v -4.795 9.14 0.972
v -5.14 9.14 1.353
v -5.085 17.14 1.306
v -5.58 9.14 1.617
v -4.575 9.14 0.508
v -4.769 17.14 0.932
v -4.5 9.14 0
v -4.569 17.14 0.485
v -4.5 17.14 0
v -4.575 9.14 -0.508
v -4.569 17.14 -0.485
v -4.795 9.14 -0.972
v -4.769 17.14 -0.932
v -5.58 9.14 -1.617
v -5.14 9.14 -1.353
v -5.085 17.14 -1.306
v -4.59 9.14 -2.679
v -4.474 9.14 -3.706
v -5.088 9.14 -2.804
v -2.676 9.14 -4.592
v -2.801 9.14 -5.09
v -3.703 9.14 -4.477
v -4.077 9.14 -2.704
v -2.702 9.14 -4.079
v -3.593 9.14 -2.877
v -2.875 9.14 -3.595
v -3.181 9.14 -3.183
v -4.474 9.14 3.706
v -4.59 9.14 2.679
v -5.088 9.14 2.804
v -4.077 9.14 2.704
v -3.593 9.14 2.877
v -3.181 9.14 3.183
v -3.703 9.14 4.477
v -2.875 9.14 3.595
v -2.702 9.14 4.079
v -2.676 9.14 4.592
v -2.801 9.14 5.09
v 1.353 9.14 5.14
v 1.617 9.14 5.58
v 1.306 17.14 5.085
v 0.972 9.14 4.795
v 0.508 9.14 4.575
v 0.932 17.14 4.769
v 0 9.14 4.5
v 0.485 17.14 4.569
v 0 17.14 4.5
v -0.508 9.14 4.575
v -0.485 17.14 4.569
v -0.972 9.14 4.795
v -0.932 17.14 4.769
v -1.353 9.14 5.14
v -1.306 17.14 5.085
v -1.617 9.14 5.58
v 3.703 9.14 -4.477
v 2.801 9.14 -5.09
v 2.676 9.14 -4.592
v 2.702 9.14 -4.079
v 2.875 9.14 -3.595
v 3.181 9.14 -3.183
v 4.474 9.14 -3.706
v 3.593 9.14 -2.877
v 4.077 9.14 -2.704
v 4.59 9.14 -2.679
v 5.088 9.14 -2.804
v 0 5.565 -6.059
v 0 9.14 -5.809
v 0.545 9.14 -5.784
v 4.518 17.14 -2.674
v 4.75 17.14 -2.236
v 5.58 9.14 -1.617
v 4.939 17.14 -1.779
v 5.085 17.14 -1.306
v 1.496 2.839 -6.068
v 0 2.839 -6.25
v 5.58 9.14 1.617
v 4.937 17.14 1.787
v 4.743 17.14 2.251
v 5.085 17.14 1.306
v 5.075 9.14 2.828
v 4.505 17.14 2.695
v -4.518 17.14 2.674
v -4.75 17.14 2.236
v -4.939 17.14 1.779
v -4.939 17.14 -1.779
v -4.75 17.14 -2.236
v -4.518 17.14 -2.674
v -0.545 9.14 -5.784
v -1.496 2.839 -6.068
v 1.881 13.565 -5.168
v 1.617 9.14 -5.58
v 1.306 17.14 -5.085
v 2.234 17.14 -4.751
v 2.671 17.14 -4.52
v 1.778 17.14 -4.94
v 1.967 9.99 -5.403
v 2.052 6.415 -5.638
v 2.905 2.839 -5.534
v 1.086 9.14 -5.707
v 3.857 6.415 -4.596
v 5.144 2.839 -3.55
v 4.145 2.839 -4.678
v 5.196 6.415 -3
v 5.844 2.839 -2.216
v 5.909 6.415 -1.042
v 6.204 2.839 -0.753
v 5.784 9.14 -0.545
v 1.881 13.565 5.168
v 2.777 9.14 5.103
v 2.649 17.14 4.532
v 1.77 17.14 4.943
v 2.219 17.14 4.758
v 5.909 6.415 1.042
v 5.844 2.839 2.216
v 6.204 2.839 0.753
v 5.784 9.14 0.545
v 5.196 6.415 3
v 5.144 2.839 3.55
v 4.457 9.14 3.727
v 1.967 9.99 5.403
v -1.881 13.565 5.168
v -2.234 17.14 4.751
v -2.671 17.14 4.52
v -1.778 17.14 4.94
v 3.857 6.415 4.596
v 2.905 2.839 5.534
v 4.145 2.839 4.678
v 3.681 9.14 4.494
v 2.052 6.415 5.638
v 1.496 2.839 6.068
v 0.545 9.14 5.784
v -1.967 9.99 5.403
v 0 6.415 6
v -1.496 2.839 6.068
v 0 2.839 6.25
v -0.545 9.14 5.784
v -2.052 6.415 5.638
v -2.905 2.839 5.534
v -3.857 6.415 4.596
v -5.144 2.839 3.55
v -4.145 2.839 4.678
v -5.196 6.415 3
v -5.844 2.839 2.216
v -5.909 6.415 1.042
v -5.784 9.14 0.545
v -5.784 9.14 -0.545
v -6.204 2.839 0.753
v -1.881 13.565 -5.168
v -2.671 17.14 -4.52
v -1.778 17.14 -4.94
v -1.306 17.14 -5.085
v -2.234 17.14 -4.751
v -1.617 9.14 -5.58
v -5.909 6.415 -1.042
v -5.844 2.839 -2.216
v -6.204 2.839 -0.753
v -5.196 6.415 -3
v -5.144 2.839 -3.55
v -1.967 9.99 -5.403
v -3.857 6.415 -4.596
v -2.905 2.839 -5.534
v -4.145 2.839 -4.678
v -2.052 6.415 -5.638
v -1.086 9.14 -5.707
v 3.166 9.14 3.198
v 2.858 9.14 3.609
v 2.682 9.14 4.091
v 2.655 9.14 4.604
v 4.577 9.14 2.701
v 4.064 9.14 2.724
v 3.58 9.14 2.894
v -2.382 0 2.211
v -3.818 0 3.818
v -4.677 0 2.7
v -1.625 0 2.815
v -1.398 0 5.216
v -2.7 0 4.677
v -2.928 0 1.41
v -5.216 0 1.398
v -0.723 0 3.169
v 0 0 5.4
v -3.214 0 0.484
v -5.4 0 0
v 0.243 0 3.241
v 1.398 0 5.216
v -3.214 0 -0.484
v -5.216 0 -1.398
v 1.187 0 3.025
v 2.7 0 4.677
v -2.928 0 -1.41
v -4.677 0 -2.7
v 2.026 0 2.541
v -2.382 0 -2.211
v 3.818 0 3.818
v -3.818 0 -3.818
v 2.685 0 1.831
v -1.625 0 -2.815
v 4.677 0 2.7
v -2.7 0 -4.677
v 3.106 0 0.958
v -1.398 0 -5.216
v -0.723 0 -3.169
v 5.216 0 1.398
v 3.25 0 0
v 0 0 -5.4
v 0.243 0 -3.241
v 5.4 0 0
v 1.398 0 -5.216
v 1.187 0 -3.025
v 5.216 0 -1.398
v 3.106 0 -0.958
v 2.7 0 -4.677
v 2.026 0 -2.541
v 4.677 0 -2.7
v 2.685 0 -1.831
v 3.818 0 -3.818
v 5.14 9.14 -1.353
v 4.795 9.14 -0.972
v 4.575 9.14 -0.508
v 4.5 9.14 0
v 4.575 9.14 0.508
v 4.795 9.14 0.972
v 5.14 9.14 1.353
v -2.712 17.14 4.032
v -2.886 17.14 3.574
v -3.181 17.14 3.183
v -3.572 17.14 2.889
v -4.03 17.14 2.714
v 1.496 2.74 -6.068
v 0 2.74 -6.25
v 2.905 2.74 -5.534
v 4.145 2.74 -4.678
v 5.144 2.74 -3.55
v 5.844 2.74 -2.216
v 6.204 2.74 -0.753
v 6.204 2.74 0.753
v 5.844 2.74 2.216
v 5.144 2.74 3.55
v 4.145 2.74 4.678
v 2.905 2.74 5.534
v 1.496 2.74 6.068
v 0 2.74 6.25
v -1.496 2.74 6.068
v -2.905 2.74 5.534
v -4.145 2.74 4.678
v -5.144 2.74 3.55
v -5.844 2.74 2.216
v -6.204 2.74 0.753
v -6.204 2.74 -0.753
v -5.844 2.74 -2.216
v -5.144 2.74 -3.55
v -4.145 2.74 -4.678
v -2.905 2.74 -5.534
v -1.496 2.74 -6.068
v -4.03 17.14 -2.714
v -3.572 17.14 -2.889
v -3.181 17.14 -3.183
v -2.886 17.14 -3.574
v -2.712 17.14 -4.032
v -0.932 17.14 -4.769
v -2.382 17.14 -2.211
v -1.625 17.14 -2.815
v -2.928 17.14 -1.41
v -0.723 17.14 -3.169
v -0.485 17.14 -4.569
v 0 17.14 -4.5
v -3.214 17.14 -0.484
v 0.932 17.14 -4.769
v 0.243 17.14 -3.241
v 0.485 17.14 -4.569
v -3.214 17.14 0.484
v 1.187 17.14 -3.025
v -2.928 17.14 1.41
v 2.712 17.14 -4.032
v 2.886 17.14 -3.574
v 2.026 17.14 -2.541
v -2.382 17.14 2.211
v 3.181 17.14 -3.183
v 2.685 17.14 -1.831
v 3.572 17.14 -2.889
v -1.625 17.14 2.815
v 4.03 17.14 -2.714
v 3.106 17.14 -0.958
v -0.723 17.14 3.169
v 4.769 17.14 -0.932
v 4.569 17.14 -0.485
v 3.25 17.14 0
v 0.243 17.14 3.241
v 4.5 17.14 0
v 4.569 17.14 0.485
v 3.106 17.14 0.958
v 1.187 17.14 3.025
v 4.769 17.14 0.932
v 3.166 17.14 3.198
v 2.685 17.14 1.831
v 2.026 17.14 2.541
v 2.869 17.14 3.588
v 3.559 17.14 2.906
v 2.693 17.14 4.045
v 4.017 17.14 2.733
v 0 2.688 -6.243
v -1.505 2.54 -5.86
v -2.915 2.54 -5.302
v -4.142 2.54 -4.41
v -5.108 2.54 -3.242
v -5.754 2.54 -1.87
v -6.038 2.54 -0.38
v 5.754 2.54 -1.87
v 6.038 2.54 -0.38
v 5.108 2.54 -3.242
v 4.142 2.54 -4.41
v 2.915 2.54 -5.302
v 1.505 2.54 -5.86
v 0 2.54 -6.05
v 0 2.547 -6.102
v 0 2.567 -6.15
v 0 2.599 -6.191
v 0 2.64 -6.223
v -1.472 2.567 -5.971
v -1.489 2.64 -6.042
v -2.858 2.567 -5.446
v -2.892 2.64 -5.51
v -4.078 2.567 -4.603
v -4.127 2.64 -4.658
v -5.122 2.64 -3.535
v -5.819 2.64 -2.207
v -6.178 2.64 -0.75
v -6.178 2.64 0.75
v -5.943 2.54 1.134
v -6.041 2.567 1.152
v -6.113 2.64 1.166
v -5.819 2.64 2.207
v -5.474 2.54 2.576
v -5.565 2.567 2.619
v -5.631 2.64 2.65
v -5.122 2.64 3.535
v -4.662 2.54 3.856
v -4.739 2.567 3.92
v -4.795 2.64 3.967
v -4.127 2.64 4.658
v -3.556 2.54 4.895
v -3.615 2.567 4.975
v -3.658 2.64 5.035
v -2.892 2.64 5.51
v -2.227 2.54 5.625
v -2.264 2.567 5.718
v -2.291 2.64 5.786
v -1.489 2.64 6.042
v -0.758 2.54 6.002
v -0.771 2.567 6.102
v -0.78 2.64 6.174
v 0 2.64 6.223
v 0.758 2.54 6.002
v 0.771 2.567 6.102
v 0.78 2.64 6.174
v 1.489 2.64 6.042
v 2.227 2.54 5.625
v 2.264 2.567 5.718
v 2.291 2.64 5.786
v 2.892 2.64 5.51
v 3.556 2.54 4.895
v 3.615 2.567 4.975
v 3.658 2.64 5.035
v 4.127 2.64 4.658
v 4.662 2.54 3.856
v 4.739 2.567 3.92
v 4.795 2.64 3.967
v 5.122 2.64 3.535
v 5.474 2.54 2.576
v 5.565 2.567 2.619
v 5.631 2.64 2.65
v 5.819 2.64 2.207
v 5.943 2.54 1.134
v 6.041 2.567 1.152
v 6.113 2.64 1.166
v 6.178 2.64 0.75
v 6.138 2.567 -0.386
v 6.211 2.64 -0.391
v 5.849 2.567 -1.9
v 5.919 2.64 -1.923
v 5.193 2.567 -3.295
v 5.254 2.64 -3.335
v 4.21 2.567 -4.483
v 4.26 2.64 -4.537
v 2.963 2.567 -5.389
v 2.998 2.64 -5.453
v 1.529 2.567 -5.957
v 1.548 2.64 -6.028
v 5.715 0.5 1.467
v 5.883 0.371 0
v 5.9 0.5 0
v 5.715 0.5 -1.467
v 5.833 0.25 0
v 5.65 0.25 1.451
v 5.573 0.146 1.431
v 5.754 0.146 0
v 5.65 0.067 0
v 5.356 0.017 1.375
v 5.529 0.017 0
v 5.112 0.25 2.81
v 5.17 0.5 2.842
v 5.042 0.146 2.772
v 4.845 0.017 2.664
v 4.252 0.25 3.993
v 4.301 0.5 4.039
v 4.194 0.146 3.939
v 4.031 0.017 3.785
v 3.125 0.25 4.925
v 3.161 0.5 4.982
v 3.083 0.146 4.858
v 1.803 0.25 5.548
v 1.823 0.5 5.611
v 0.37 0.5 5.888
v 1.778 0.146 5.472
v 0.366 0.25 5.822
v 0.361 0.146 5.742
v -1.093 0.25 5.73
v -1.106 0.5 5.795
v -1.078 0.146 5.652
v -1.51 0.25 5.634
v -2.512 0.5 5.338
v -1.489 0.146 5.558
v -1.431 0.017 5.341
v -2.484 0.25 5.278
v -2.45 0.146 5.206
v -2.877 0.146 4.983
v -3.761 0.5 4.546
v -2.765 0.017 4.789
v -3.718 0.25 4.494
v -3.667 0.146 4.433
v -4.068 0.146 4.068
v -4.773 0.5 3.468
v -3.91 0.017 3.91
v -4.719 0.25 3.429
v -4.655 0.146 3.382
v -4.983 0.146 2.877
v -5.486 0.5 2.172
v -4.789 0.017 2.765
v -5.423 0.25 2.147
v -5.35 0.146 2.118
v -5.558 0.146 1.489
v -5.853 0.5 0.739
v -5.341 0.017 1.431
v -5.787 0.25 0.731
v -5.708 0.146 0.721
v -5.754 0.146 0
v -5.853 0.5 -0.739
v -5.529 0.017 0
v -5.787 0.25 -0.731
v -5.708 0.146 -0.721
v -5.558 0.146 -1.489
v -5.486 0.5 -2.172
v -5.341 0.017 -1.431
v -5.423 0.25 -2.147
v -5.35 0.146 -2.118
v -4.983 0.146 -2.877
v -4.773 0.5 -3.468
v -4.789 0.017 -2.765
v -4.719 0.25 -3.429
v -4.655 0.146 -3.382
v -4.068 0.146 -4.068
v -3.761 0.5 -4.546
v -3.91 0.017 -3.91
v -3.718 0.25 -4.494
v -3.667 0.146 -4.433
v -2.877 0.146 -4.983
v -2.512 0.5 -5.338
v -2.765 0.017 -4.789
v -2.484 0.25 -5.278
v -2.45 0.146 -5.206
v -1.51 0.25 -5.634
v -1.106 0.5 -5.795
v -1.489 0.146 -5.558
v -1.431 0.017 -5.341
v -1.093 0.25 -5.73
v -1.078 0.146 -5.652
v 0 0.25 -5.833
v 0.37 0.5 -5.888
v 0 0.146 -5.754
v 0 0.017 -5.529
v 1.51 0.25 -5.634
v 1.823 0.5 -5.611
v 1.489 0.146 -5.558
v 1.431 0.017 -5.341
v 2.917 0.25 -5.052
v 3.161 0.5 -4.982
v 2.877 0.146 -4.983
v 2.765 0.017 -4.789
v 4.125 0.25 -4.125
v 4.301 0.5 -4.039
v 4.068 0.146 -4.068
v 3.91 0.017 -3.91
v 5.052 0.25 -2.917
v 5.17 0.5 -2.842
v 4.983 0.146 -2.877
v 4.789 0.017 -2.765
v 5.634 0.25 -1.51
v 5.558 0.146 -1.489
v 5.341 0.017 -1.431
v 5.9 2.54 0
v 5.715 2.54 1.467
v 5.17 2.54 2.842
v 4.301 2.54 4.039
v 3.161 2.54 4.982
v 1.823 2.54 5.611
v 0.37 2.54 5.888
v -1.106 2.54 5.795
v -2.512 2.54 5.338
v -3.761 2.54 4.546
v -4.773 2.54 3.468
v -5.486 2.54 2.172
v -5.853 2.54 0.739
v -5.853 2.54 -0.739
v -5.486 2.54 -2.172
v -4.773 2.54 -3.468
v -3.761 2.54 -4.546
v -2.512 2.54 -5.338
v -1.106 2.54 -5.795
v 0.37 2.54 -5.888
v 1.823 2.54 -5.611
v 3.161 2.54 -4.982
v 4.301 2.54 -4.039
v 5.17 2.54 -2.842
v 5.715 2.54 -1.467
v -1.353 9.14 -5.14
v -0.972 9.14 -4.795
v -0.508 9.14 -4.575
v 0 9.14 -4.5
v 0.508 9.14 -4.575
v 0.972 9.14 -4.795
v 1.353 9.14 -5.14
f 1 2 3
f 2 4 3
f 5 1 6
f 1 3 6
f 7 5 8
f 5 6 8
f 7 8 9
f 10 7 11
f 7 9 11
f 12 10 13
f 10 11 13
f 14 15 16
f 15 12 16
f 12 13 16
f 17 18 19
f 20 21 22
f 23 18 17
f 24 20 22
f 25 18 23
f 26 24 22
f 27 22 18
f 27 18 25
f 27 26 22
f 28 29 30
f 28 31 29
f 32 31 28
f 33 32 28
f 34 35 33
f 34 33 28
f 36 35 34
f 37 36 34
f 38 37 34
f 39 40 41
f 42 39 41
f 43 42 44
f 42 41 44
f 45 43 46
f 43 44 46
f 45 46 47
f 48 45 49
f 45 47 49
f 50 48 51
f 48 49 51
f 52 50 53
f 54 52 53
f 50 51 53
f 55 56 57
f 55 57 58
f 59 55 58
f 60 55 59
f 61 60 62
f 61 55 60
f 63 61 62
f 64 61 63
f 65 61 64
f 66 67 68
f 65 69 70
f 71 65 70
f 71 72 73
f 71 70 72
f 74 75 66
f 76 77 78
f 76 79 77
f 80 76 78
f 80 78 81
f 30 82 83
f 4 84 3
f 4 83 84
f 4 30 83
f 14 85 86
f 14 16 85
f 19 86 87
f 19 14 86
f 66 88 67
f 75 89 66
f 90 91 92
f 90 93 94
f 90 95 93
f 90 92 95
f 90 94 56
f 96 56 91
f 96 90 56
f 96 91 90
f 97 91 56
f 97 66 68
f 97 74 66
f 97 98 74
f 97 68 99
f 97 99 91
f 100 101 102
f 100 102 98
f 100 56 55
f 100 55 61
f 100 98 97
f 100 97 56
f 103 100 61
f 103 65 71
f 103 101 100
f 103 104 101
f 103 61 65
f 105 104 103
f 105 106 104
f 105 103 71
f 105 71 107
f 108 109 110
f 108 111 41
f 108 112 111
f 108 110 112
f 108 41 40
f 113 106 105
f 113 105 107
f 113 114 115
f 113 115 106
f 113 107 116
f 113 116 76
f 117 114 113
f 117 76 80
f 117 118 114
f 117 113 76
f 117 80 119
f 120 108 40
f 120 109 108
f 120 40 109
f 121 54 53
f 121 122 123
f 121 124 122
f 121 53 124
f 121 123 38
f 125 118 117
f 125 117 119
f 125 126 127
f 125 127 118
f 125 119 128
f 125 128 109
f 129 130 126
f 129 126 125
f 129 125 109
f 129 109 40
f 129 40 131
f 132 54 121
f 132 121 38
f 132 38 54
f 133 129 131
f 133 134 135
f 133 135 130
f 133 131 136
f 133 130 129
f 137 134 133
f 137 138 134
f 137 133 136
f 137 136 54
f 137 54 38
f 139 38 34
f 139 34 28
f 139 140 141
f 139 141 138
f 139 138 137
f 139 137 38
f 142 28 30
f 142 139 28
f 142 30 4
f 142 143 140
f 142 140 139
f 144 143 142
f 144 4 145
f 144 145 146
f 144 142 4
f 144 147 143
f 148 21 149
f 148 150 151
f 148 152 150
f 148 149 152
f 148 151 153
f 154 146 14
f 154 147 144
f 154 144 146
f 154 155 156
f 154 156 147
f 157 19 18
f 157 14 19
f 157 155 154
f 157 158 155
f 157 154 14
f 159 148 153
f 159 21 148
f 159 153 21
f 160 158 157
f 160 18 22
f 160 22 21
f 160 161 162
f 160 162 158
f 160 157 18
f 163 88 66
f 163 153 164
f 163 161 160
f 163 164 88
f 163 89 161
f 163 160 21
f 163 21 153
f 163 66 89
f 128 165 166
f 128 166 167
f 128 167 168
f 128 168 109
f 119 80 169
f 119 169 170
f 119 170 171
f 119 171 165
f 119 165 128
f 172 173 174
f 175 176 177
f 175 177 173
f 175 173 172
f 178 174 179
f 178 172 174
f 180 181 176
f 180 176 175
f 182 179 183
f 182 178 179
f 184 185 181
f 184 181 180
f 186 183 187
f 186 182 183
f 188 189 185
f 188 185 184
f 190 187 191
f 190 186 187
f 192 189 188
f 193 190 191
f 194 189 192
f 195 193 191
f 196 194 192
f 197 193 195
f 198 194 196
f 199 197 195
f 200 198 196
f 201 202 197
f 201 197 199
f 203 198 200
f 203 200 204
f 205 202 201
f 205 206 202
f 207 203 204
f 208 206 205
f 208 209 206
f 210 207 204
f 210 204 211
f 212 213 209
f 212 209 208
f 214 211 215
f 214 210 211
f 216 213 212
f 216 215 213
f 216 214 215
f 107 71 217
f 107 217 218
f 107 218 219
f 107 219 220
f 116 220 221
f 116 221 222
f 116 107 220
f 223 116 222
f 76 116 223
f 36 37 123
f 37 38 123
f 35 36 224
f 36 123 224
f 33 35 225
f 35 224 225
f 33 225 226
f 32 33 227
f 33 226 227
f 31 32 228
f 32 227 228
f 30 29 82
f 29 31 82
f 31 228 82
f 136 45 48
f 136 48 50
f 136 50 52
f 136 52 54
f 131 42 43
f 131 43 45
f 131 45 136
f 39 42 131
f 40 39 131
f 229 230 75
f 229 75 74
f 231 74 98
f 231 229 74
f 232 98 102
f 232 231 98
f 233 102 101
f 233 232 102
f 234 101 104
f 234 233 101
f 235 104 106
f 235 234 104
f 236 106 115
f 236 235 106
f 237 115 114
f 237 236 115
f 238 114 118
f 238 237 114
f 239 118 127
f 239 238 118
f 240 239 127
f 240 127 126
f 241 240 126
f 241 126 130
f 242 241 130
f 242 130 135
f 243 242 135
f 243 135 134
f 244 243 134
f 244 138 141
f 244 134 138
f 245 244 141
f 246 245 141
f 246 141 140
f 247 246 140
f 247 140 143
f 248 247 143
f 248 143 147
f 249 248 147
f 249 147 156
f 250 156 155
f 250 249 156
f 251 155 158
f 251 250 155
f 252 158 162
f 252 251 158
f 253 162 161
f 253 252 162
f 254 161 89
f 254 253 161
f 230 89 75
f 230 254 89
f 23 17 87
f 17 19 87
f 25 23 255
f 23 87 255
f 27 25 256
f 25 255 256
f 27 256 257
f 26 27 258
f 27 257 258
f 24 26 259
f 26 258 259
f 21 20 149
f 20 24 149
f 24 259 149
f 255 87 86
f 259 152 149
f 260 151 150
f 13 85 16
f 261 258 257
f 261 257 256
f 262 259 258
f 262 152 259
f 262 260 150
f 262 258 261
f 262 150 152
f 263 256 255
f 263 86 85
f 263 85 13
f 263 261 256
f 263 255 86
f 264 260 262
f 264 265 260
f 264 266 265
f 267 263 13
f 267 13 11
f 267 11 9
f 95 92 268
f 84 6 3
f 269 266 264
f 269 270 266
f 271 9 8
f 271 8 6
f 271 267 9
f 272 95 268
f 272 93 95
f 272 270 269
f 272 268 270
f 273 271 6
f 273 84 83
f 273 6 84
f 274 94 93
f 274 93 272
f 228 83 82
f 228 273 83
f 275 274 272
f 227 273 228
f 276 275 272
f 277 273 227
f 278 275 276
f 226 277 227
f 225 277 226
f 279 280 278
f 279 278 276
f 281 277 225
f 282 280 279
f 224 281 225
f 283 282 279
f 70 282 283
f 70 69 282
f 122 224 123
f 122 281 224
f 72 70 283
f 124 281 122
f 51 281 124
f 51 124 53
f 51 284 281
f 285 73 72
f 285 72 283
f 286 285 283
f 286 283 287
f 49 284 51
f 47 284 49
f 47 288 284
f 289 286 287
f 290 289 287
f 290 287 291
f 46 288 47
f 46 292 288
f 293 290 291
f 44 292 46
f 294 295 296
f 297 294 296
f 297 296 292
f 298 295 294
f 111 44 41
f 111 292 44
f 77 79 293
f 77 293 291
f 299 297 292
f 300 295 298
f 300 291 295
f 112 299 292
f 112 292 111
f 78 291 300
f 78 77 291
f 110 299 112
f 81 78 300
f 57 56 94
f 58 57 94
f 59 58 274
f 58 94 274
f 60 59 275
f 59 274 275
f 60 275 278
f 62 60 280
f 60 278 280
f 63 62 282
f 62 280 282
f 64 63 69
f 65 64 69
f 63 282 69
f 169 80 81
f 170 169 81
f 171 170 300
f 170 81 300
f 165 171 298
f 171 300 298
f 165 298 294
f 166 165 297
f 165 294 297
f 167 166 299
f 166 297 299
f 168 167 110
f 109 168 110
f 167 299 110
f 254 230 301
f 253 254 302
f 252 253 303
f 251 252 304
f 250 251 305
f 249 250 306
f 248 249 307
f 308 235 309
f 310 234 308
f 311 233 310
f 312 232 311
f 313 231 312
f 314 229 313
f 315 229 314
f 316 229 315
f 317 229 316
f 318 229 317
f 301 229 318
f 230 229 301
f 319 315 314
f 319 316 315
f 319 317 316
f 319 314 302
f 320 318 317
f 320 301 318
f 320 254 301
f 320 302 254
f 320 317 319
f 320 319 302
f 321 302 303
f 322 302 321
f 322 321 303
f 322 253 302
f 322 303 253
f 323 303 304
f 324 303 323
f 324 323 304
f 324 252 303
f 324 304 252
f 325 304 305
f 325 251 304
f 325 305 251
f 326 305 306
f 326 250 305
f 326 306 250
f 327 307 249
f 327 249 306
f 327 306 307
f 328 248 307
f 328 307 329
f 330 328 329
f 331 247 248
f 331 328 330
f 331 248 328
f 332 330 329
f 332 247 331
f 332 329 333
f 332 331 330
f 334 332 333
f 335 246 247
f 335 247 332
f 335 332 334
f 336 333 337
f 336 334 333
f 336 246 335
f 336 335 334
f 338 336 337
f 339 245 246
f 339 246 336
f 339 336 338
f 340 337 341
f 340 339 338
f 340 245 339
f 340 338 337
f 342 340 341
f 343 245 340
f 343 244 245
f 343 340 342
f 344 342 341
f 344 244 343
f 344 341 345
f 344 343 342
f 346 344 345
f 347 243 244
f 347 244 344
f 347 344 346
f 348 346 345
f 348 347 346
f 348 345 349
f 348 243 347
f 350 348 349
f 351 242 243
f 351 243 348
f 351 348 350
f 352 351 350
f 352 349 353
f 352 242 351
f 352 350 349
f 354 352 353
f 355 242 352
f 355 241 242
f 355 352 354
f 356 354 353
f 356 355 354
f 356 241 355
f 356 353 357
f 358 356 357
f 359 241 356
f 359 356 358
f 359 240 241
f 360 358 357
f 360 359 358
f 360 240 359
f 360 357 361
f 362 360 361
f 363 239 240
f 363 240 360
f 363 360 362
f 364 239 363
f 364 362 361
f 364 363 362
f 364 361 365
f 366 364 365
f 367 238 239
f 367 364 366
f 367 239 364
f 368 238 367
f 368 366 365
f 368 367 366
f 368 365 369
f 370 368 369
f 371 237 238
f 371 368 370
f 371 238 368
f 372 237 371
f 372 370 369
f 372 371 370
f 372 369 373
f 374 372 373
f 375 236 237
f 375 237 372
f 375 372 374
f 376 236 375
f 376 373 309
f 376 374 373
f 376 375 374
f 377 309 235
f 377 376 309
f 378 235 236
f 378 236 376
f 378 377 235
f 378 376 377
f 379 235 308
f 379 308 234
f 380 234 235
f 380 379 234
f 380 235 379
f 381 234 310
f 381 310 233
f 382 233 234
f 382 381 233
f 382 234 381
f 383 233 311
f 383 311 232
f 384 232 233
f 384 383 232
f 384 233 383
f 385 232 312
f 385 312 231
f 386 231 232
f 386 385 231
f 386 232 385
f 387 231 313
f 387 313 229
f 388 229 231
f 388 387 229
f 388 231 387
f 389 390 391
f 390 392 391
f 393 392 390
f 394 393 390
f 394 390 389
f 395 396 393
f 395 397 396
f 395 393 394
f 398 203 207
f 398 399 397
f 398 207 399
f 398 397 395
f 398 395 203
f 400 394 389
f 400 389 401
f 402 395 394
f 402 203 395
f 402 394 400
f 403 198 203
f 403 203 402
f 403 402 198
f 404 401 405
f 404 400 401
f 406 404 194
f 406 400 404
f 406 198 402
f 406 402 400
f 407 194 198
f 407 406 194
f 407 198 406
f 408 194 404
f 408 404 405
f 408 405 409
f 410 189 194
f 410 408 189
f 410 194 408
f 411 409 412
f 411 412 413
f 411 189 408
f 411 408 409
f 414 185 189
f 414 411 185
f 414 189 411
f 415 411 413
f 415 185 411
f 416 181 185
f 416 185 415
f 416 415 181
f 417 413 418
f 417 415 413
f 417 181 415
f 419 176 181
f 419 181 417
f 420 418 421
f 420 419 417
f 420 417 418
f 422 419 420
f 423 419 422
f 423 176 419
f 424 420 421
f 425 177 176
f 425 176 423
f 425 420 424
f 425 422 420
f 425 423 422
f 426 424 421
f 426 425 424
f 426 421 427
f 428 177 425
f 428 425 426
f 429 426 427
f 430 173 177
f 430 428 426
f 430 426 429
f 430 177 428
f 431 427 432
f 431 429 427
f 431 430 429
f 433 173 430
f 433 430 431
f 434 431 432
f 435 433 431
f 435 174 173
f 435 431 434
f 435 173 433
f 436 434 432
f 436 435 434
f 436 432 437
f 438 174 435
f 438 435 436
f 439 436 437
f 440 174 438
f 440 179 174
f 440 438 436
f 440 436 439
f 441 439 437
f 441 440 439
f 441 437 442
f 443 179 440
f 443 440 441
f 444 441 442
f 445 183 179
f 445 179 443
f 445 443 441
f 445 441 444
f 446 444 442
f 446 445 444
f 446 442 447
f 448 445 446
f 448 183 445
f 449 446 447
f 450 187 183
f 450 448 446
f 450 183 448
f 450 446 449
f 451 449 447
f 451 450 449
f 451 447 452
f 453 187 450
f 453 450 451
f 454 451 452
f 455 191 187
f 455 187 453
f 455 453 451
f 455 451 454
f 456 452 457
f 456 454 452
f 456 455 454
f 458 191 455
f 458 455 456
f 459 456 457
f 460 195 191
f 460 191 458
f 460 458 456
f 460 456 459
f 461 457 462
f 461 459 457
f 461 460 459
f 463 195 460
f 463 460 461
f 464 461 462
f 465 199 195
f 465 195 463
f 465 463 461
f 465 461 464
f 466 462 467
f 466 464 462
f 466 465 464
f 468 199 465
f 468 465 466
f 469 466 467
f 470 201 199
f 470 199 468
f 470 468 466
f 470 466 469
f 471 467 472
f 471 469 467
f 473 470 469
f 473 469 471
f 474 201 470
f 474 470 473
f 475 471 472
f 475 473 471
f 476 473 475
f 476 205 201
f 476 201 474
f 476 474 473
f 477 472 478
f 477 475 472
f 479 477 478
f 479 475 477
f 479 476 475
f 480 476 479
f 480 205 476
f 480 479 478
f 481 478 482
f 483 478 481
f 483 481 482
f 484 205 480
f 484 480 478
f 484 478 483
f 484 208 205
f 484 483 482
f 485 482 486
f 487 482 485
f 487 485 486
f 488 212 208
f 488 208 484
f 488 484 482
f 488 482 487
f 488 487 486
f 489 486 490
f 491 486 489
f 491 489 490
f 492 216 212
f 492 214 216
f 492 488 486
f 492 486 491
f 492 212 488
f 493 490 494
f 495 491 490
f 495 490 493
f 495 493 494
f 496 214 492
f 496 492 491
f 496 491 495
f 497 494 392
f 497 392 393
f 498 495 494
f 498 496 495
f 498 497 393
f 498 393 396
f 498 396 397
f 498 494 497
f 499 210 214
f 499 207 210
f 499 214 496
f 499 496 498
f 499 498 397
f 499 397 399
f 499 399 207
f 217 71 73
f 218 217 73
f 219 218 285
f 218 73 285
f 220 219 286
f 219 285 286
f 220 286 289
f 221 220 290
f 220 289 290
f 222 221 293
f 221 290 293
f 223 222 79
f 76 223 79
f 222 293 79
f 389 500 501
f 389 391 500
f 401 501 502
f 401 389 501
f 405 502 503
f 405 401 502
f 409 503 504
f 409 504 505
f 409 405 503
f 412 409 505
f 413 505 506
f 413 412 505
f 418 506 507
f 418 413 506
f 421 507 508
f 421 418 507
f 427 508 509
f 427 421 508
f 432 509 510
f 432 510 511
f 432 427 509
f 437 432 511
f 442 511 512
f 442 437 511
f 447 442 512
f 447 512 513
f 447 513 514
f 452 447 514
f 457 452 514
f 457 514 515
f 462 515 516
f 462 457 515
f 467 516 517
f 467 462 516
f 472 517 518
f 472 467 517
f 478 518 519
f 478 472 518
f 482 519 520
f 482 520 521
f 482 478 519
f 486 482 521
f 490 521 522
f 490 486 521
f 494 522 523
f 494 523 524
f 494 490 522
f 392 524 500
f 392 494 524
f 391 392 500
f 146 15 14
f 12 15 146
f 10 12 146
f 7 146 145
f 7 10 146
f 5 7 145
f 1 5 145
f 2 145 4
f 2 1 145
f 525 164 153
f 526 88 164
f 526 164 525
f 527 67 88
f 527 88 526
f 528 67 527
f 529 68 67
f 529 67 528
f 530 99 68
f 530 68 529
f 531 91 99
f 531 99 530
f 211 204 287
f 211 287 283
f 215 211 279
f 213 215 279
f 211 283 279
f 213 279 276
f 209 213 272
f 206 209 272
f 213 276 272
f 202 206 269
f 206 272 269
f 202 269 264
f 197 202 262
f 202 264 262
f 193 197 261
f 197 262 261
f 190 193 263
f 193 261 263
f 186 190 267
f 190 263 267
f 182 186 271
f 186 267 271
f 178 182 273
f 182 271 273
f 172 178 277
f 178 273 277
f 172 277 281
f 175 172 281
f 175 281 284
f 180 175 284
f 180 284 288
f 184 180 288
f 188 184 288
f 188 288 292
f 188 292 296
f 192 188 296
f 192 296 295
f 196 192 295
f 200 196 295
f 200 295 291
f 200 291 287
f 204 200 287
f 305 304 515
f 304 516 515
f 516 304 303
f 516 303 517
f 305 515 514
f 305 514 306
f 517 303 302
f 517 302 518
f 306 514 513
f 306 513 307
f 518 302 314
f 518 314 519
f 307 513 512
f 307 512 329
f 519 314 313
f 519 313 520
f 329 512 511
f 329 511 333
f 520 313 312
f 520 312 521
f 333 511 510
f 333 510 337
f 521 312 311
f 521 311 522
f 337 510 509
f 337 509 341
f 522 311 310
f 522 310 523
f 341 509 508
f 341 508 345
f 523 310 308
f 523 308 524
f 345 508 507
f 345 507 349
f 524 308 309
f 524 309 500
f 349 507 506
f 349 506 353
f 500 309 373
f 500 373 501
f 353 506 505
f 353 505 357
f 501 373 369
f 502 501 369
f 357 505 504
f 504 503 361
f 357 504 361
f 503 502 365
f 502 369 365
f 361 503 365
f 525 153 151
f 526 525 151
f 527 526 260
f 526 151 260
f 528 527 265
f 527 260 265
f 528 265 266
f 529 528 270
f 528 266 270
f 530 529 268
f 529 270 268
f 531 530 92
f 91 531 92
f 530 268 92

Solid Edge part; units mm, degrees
sketch "Sketch1" plane through (0, 0, 0) normal (0, -1, 0) x (1, 0, 0)
  circle A0 centre (0, 0) radius 5.9
extrude "Protrusion1" add sketch "Sketch1" against normal blind 2.54
sketch "Sketch2" plane through (0, 2.54, 0) normal (0, 1, 0) x (0, 0, -1)
  circle A0 centre (0, 0) radius 6.25
extrude "Ajout_matière_3" add sketch "Sketch2" along normal blind 14.6
fillet "Congé_1" radius 0.5 1 edges at (-5.9, 0, 0)
fillet "Congé_2" radius 0.2 1 edges at (0, 2.54, 6.25)
chamfer "Chanfrein_1" distance 1 angle 86 1 edges at (0, 17.14, 6.25) measured on face at (-4.0417, 17.14, -4.2917)
sketch "Sketch3" plane through (0, 17.14, 0) normal (0, 1, 0) x (1, 0, 0)
  circle A0 centre (0, 0) radius 3.25
extrude "Enlèvement_matière_1" cut sketch "Sketch3" against normal blind 26
sketch "Sketch4" plane through (0, 17.14, 0) normal (0, 1, 0) x (1, 0, 0)
  circle A0 centre (0, -6.25) radius 1.75
  circle A1 centre (-4.4179, -4.4209) radius 1.75
  circle A2 centre (-6.25, 0) radius 1.75
  circle A3 centre (-4.4179, 4.4209) radius 1.75
  circle A4 centre (0, 6.25) radius 1.75
  circle A5 centre (4.4179, 4.4209) radius 1.75
  circle A6 centre (6.25, 0) radius 1.75
  circle A7 centre (4.397, -4.4417) radius 1.75
  dimension "D1" = 3.5
extrude "Enlèvement_matière_3" cut sketch "Sketch4" against normal blind 8
